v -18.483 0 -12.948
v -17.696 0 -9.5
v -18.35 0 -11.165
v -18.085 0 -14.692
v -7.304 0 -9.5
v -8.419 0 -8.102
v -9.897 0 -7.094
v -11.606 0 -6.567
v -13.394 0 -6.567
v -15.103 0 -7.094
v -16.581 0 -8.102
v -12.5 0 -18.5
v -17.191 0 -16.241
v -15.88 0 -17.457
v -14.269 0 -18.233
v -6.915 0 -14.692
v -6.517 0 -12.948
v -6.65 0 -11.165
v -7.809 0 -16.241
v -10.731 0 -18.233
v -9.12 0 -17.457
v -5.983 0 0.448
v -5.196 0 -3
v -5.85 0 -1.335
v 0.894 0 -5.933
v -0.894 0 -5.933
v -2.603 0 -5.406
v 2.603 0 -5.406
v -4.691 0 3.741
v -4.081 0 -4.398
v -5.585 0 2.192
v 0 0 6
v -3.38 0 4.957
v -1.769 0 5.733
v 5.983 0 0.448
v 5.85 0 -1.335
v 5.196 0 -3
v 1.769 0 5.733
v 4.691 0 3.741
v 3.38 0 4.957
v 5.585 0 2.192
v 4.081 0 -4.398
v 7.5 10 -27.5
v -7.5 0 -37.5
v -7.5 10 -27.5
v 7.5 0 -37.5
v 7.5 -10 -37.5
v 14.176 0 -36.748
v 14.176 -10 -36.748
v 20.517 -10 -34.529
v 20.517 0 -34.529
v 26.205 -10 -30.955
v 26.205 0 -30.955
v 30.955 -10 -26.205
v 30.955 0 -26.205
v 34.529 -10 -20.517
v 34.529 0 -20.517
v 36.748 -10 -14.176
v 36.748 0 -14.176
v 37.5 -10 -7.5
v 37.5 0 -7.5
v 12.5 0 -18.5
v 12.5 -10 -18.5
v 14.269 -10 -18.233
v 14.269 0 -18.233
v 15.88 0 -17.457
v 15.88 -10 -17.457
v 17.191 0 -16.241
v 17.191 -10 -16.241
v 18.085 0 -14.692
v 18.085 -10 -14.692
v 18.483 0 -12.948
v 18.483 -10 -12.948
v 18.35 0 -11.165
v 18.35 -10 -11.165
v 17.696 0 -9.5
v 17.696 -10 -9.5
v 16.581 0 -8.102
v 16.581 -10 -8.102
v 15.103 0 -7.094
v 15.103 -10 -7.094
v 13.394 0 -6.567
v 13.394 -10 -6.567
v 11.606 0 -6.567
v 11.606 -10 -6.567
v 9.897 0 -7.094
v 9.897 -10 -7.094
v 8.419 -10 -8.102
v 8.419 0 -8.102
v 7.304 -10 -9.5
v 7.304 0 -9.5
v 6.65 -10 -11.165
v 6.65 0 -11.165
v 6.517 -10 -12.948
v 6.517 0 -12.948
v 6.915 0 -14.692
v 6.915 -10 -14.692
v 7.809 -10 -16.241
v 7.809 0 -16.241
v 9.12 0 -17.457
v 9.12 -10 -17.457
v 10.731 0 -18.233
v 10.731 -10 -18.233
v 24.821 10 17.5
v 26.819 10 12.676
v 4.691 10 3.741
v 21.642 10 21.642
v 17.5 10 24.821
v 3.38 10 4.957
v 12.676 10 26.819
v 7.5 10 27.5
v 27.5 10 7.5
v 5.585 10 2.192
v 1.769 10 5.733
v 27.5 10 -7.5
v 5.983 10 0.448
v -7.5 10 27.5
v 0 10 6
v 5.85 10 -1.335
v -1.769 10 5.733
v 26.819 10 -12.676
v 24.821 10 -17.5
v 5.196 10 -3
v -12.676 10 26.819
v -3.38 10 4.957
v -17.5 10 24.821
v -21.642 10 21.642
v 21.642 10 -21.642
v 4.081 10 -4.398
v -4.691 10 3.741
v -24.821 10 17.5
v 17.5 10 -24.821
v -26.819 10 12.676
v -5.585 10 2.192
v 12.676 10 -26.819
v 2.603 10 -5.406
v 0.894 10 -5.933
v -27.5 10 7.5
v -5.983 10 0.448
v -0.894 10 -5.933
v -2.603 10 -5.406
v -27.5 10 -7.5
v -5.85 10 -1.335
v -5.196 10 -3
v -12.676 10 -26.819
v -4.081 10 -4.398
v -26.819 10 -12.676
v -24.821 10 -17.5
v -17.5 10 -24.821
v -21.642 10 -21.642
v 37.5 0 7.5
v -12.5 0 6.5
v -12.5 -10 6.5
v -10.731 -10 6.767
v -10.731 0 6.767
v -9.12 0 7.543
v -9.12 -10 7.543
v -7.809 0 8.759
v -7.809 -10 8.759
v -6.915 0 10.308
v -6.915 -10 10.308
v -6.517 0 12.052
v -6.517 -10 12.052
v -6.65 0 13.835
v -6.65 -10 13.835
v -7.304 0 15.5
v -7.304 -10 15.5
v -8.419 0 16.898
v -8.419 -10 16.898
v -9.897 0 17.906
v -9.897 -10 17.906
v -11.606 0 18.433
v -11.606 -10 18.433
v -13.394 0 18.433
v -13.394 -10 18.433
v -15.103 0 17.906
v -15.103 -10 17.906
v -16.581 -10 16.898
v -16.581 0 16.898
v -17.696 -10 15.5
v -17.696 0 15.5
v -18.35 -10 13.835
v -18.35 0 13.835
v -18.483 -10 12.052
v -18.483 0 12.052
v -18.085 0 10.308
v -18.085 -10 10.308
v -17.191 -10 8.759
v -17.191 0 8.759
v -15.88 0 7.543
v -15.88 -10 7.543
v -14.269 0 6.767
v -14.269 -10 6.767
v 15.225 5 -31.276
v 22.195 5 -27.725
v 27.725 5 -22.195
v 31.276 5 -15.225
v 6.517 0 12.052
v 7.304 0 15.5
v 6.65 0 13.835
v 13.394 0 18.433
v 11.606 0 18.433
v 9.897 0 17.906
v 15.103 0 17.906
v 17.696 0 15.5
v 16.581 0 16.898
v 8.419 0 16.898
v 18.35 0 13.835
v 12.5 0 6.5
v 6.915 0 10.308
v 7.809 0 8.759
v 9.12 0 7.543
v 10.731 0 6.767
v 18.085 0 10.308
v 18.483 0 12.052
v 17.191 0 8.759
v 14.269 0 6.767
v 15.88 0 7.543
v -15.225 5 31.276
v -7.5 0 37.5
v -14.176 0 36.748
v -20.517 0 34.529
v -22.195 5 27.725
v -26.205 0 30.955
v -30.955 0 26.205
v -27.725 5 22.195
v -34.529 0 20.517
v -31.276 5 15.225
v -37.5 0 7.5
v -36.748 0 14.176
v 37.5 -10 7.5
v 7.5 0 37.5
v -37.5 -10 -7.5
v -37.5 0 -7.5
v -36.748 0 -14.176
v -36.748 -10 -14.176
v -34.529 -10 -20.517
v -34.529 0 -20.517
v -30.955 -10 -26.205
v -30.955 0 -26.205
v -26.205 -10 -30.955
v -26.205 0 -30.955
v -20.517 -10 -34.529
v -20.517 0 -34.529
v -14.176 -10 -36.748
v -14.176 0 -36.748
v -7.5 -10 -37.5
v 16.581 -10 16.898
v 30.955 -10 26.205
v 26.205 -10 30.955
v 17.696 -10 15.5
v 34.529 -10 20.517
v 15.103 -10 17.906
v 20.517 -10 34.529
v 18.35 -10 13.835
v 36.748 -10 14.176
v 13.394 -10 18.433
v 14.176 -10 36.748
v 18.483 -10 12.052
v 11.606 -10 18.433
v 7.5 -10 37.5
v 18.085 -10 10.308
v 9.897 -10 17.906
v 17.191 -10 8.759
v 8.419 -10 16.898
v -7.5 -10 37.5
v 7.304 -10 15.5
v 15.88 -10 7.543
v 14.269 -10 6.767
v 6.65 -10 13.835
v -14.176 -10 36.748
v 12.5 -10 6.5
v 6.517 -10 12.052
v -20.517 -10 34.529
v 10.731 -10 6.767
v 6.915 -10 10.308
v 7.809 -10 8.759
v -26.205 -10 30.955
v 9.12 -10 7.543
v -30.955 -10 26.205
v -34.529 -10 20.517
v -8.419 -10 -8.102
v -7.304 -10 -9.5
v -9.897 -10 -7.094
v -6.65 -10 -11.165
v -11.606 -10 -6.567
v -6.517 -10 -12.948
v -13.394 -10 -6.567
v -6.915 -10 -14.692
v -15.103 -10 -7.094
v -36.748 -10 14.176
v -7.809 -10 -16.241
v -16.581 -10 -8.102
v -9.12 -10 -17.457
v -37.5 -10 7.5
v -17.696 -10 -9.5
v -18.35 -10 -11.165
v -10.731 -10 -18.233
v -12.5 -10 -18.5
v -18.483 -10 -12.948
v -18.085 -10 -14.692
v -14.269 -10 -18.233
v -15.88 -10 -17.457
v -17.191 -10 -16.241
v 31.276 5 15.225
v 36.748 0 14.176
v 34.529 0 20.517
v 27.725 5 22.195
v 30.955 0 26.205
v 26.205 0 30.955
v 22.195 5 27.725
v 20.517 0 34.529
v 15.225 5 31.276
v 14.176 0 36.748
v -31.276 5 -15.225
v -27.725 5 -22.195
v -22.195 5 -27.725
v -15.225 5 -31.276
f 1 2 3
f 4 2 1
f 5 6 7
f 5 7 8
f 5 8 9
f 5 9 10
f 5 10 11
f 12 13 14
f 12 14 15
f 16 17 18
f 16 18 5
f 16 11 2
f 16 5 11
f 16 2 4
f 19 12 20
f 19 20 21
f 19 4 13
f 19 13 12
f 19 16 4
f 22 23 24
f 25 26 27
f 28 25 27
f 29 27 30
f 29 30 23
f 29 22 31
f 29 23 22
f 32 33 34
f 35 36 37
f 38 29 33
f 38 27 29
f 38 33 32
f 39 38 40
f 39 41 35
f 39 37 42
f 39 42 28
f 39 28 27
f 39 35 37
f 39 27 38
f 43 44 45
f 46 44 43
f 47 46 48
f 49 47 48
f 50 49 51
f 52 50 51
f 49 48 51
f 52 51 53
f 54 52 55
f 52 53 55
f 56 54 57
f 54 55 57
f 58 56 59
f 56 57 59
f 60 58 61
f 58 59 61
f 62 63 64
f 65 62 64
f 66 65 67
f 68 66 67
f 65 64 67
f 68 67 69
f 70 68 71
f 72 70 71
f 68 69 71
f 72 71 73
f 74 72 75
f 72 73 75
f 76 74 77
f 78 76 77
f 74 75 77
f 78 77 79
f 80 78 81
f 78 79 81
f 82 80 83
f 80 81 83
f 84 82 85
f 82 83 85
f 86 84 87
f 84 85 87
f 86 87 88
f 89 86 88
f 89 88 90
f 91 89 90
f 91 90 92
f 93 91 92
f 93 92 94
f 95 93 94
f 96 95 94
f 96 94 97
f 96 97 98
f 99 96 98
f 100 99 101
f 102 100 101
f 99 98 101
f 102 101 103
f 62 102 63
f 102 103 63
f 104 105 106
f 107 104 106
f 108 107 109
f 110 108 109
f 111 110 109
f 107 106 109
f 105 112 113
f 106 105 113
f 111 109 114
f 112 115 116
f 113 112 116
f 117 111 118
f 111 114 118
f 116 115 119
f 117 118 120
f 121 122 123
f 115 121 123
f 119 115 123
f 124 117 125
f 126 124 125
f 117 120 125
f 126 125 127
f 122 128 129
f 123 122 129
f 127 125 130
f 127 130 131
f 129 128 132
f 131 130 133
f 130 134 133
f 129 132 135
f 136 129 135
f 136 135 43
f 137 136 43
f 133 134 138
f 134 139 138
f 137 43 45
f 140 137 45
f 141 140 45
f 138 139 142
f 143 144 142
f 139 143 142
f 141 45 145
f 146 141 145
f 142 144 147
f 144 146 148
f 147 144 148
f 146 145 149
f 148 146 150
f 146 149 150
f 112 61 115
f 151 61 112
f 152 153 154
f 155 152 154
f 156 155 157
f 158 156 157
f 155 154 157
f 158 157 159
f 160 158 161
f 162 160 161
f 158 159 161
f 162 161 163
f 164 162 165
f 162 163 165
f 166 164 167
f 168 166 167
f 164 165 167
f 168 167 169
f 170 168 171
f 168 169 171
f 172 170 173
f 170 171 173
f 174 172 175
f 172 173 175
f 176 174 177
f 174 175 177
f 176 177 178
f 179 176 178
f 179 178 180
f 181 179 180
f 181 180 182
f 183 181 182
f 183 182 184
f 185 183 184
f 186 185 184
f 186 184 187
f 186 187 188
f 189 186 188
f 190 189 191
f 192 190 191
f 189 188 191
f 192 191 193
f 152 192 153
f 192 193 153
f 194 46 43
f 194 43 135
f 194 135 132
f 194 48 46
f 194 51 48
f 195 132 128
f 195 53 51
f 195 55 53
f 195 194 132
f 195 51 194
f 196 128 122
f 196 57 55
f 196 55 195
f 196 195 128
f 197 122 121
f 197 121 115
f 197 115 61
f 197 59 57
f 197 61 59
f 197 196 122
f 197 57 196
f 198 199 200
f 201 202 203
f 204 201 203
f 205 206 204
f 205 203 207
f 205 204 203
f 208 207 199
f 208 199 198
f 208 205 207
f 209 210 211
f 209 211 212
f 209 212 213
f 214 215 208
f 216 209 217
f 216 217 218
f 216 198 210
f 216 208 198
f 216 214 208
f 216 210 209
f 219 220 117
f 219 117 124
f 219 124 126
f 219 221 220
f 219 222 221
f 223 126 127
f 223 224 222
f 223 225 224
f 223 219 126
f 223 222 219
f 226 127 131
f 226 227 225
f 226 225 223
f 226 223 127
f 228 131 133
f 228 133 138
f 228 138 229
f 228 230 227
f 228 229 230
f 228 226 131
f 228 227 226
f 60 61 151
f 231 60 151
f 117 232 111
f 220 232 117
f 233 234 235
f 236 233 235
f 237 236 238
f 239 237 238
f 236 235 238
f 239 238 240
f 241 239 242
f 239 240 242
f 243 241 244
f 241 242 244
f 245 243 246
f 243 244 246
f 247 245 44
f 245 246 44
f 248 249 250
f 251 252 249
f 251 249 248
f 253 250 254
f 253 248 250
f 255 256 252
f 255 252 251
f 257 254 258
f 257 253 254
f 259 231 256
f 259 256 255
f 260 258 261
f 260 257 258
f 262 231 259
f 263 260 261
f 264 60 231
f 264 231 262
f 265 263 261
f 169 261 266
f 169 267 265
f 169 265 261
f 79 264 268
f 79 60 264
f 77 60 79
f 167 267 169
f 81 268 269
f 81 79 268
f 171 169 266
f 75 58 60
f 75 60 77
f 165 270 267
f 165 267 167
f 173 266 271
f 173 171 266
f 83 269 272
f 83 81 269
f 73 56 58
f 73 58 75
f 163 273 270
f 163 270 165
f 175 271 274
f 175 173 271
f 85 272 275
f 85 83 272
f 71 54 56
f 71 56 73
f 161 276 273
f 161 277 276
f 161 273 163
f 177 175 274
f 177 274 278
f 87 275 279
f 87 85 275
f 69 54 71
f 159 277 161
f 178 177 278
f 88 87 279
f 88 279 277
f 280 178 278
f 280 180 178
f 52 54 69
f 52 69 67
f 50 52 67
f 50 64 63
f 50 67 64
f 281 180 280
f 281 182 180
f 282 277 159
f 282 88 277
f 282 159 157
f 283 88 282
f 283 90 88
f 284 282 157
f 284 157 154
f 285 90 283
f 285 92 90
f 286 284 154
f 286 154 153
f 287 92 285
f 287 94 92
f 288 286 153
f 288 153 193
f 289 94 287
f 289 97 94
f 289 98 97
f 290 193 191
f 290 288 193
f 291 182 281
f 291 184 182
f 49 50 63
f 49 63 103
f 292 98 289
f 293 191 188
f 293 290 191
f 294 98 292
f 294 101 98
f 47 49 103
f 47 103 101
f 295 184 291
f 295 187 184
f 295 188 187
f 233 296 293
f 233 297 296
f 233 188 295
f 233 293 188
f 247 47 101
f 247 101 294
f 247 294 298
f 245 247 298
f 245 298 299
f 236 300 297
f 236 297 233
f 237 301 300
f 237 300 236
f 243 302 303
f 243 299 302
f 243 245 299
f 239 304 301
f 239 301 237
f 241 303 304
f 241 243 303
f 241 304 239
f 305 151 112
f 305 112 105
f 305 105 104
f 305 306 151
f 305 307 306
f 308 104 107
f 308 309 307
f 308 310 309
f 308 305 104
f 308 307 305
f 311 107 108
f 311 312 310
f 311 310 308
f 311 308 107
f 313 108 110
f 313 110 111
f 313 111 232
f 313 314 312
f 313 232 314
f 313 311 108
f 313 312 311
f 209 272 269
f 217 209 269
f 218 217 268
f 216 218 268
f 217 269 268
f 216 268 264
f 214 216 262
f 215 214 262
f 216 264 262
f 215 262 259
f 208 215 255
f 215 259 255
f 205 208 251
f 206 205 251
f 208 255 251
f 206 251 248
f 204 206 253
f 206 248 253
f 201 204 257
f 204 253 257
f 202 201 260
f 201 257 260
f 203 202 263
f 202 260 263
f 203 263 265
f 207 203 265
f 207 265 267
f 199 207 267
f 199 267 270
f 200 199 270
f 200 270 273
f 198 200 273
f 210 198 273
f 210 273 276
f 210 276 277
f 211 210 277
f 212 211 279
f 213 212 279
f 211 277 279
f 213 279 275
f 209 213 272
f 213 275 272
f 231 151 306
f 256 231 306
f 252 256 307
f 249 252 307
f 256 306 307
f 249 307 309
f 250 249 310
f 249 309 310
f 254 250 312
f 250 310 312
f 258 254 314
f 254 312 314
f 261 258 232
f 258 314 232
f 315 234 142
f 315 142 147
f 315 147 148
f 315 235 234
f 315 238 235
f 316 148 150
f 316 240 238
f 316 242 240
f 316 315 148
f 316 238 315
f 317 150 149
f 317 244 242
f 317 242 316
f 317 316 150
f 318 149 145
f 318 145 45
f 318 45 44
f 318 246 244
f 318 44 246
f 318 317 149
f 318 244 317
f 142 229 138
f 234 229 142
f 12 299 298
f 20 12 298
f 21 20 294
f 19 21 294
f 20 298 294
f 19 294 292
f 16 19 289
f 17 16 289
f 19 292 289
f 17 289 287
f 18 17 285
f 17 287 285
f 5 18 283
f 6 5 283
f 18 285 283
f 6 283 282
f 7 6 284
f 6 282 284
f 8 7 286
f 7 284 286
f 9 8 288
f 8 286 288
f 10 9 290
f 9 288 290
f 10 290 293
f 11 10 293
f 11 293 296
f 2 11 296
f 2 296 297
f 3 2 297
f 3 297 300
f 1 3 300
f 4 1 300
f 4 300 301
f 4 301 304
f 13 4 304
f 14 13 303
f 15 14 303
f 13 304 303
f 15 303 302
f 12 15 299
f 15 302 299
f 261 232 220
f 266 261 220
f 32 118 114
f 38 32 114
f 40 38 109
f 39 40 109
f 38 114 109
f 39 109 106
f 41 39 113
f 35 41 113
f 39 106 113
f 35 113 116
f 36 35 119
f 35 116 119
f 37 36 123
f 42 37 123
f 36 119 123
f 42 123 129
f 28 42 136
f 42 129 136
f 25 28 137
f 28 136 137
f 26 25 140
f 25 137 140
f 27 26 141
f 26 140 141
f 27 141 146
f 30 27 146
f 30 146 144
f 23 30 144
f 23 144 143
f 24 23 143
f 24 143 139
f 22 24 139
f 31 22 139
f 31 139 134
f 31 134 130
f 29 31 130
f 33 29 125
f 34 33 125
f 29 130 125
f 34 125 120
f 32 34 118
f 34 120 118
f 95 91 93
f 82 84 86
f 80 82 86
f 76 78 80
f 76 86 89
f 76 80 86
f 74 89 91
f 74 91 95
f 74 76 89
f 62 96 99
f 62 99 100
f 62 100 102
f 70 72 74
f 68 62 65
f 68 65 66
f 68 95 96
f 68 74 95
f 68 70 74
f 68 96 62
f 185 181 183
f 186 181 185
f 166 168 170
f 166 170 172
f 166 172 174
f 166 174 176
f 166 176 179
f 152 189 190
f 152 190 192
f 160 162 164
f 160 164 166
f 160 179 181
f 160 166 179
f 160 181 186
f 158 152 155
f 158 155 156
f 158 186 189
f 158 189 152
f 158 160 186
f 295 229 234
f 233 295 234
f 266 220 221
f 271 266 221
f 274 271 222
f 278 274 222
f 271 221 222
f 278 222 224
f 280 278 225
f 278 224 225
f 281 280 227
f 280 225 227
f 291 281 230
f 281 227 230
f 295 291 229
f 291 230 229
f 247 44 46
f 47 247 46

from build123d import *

# Parameters (mm, degrees)
BOSS_EXTRUDE1_DEPTH = 10
CHAMFER1_SIZE       = 10
SKETCH3_R           = 6
CUT_EXTRUDE2_DEPTH  = 10
SKETCH5_R           = 6
CUT_EXTRUDE3_DEPTH  = 10


with BuildPart() as part:
    # Sketch1 → Boss-Extrude1 (new, symmetric)
    with BuildSketch(Plane(origin=(0, 0, 0), x_dir=(1, 0, 0), z_dir=(0, 1, 0))):
        with BuildLine():
            Line((-7.5, 37.5), (7.5, 37.5))
            ThreePointArc((7.5, 37.5), (28.713203436, 28.713203436), (37.5, 7.5))
            Line((37.5, 7.5), (37.5, -7.5))
            ThreePointArc((37.5, -7.5), (28.713203436, -28.713203436), (7.5, -37.5))
            Line((7.5, -37.5), (-7.5, -37.5))
            ThreePointArc((-7.5, -37.5), (-28.713203436, -28.713203436), (-37.5, -7.5))
            Line((-37.5, -7.5), (-37.5, 7.5))
            ThreePointArc((-37.5, 7.5), (-28.713203436, 28.713203436), (-7.5, 37.5))
        make_face()
    extrude(amount=BOSS_EXTRUDE1_DEPTH, both=True)

    # Chamfer1
    chamfer1_edges = [part.edges().sort_by_distance(p)[0] for p in [
        (28.713203436, 10, 28.713203436),
        (37.5, 10, 0),
        (28.713203436, 10, -28.713203436),
        (0, 10, -37.5),
        (-28.713203436, 10, -28.713203436),
        (-37.5, 10, 0),
        (-28.713203436, 10, 28.713203436),
        (0, 10, 37.5),
    ]]
    chamfer(chamfer1_edges, length=CHAMFER1_SIZE)

    # Sketch3 → Cut-Extrude2 (cut)
    with BuildSketch(Plane.XZ.offset(10)):
        with Locations(Location((12.5, 12.5, 0), (0, 0, 270))):
            Circle(SKETCH3_R)
        with Locations(Location((-12.5, 12.5, 0), (0, 0, 270))):
            Circle(SKETCH3_R)
        with Locations(Location((12.5, -12.5, 0), (0, 0, 270))):
            Circle(SKETCH3_R)
        with Locations(Location((-12.5, -12.5, 0), (0, 0, 270))):
            Circle(SKETCH3_R)
    extrude(amount=-CUT_EXTRUDE2_DEPTH, mode=Mode.SUBTRACT)

    # Sketch5 → Cut-Extrude3 (cut)
    with BuildSketch(Plane(origin=(0, 10, 0), x_dir=(1, 0, 0), z_dir=(0, 1, 0))):
        with Locations(Location((0, 0, 0), (0, 0, 270))):
            Circle(SKETCH5_R)
    extrude(amount=-CUT_EXTRUDE3_DEPTH, mode=Mode.SUBTRACT)


solid = part.part
